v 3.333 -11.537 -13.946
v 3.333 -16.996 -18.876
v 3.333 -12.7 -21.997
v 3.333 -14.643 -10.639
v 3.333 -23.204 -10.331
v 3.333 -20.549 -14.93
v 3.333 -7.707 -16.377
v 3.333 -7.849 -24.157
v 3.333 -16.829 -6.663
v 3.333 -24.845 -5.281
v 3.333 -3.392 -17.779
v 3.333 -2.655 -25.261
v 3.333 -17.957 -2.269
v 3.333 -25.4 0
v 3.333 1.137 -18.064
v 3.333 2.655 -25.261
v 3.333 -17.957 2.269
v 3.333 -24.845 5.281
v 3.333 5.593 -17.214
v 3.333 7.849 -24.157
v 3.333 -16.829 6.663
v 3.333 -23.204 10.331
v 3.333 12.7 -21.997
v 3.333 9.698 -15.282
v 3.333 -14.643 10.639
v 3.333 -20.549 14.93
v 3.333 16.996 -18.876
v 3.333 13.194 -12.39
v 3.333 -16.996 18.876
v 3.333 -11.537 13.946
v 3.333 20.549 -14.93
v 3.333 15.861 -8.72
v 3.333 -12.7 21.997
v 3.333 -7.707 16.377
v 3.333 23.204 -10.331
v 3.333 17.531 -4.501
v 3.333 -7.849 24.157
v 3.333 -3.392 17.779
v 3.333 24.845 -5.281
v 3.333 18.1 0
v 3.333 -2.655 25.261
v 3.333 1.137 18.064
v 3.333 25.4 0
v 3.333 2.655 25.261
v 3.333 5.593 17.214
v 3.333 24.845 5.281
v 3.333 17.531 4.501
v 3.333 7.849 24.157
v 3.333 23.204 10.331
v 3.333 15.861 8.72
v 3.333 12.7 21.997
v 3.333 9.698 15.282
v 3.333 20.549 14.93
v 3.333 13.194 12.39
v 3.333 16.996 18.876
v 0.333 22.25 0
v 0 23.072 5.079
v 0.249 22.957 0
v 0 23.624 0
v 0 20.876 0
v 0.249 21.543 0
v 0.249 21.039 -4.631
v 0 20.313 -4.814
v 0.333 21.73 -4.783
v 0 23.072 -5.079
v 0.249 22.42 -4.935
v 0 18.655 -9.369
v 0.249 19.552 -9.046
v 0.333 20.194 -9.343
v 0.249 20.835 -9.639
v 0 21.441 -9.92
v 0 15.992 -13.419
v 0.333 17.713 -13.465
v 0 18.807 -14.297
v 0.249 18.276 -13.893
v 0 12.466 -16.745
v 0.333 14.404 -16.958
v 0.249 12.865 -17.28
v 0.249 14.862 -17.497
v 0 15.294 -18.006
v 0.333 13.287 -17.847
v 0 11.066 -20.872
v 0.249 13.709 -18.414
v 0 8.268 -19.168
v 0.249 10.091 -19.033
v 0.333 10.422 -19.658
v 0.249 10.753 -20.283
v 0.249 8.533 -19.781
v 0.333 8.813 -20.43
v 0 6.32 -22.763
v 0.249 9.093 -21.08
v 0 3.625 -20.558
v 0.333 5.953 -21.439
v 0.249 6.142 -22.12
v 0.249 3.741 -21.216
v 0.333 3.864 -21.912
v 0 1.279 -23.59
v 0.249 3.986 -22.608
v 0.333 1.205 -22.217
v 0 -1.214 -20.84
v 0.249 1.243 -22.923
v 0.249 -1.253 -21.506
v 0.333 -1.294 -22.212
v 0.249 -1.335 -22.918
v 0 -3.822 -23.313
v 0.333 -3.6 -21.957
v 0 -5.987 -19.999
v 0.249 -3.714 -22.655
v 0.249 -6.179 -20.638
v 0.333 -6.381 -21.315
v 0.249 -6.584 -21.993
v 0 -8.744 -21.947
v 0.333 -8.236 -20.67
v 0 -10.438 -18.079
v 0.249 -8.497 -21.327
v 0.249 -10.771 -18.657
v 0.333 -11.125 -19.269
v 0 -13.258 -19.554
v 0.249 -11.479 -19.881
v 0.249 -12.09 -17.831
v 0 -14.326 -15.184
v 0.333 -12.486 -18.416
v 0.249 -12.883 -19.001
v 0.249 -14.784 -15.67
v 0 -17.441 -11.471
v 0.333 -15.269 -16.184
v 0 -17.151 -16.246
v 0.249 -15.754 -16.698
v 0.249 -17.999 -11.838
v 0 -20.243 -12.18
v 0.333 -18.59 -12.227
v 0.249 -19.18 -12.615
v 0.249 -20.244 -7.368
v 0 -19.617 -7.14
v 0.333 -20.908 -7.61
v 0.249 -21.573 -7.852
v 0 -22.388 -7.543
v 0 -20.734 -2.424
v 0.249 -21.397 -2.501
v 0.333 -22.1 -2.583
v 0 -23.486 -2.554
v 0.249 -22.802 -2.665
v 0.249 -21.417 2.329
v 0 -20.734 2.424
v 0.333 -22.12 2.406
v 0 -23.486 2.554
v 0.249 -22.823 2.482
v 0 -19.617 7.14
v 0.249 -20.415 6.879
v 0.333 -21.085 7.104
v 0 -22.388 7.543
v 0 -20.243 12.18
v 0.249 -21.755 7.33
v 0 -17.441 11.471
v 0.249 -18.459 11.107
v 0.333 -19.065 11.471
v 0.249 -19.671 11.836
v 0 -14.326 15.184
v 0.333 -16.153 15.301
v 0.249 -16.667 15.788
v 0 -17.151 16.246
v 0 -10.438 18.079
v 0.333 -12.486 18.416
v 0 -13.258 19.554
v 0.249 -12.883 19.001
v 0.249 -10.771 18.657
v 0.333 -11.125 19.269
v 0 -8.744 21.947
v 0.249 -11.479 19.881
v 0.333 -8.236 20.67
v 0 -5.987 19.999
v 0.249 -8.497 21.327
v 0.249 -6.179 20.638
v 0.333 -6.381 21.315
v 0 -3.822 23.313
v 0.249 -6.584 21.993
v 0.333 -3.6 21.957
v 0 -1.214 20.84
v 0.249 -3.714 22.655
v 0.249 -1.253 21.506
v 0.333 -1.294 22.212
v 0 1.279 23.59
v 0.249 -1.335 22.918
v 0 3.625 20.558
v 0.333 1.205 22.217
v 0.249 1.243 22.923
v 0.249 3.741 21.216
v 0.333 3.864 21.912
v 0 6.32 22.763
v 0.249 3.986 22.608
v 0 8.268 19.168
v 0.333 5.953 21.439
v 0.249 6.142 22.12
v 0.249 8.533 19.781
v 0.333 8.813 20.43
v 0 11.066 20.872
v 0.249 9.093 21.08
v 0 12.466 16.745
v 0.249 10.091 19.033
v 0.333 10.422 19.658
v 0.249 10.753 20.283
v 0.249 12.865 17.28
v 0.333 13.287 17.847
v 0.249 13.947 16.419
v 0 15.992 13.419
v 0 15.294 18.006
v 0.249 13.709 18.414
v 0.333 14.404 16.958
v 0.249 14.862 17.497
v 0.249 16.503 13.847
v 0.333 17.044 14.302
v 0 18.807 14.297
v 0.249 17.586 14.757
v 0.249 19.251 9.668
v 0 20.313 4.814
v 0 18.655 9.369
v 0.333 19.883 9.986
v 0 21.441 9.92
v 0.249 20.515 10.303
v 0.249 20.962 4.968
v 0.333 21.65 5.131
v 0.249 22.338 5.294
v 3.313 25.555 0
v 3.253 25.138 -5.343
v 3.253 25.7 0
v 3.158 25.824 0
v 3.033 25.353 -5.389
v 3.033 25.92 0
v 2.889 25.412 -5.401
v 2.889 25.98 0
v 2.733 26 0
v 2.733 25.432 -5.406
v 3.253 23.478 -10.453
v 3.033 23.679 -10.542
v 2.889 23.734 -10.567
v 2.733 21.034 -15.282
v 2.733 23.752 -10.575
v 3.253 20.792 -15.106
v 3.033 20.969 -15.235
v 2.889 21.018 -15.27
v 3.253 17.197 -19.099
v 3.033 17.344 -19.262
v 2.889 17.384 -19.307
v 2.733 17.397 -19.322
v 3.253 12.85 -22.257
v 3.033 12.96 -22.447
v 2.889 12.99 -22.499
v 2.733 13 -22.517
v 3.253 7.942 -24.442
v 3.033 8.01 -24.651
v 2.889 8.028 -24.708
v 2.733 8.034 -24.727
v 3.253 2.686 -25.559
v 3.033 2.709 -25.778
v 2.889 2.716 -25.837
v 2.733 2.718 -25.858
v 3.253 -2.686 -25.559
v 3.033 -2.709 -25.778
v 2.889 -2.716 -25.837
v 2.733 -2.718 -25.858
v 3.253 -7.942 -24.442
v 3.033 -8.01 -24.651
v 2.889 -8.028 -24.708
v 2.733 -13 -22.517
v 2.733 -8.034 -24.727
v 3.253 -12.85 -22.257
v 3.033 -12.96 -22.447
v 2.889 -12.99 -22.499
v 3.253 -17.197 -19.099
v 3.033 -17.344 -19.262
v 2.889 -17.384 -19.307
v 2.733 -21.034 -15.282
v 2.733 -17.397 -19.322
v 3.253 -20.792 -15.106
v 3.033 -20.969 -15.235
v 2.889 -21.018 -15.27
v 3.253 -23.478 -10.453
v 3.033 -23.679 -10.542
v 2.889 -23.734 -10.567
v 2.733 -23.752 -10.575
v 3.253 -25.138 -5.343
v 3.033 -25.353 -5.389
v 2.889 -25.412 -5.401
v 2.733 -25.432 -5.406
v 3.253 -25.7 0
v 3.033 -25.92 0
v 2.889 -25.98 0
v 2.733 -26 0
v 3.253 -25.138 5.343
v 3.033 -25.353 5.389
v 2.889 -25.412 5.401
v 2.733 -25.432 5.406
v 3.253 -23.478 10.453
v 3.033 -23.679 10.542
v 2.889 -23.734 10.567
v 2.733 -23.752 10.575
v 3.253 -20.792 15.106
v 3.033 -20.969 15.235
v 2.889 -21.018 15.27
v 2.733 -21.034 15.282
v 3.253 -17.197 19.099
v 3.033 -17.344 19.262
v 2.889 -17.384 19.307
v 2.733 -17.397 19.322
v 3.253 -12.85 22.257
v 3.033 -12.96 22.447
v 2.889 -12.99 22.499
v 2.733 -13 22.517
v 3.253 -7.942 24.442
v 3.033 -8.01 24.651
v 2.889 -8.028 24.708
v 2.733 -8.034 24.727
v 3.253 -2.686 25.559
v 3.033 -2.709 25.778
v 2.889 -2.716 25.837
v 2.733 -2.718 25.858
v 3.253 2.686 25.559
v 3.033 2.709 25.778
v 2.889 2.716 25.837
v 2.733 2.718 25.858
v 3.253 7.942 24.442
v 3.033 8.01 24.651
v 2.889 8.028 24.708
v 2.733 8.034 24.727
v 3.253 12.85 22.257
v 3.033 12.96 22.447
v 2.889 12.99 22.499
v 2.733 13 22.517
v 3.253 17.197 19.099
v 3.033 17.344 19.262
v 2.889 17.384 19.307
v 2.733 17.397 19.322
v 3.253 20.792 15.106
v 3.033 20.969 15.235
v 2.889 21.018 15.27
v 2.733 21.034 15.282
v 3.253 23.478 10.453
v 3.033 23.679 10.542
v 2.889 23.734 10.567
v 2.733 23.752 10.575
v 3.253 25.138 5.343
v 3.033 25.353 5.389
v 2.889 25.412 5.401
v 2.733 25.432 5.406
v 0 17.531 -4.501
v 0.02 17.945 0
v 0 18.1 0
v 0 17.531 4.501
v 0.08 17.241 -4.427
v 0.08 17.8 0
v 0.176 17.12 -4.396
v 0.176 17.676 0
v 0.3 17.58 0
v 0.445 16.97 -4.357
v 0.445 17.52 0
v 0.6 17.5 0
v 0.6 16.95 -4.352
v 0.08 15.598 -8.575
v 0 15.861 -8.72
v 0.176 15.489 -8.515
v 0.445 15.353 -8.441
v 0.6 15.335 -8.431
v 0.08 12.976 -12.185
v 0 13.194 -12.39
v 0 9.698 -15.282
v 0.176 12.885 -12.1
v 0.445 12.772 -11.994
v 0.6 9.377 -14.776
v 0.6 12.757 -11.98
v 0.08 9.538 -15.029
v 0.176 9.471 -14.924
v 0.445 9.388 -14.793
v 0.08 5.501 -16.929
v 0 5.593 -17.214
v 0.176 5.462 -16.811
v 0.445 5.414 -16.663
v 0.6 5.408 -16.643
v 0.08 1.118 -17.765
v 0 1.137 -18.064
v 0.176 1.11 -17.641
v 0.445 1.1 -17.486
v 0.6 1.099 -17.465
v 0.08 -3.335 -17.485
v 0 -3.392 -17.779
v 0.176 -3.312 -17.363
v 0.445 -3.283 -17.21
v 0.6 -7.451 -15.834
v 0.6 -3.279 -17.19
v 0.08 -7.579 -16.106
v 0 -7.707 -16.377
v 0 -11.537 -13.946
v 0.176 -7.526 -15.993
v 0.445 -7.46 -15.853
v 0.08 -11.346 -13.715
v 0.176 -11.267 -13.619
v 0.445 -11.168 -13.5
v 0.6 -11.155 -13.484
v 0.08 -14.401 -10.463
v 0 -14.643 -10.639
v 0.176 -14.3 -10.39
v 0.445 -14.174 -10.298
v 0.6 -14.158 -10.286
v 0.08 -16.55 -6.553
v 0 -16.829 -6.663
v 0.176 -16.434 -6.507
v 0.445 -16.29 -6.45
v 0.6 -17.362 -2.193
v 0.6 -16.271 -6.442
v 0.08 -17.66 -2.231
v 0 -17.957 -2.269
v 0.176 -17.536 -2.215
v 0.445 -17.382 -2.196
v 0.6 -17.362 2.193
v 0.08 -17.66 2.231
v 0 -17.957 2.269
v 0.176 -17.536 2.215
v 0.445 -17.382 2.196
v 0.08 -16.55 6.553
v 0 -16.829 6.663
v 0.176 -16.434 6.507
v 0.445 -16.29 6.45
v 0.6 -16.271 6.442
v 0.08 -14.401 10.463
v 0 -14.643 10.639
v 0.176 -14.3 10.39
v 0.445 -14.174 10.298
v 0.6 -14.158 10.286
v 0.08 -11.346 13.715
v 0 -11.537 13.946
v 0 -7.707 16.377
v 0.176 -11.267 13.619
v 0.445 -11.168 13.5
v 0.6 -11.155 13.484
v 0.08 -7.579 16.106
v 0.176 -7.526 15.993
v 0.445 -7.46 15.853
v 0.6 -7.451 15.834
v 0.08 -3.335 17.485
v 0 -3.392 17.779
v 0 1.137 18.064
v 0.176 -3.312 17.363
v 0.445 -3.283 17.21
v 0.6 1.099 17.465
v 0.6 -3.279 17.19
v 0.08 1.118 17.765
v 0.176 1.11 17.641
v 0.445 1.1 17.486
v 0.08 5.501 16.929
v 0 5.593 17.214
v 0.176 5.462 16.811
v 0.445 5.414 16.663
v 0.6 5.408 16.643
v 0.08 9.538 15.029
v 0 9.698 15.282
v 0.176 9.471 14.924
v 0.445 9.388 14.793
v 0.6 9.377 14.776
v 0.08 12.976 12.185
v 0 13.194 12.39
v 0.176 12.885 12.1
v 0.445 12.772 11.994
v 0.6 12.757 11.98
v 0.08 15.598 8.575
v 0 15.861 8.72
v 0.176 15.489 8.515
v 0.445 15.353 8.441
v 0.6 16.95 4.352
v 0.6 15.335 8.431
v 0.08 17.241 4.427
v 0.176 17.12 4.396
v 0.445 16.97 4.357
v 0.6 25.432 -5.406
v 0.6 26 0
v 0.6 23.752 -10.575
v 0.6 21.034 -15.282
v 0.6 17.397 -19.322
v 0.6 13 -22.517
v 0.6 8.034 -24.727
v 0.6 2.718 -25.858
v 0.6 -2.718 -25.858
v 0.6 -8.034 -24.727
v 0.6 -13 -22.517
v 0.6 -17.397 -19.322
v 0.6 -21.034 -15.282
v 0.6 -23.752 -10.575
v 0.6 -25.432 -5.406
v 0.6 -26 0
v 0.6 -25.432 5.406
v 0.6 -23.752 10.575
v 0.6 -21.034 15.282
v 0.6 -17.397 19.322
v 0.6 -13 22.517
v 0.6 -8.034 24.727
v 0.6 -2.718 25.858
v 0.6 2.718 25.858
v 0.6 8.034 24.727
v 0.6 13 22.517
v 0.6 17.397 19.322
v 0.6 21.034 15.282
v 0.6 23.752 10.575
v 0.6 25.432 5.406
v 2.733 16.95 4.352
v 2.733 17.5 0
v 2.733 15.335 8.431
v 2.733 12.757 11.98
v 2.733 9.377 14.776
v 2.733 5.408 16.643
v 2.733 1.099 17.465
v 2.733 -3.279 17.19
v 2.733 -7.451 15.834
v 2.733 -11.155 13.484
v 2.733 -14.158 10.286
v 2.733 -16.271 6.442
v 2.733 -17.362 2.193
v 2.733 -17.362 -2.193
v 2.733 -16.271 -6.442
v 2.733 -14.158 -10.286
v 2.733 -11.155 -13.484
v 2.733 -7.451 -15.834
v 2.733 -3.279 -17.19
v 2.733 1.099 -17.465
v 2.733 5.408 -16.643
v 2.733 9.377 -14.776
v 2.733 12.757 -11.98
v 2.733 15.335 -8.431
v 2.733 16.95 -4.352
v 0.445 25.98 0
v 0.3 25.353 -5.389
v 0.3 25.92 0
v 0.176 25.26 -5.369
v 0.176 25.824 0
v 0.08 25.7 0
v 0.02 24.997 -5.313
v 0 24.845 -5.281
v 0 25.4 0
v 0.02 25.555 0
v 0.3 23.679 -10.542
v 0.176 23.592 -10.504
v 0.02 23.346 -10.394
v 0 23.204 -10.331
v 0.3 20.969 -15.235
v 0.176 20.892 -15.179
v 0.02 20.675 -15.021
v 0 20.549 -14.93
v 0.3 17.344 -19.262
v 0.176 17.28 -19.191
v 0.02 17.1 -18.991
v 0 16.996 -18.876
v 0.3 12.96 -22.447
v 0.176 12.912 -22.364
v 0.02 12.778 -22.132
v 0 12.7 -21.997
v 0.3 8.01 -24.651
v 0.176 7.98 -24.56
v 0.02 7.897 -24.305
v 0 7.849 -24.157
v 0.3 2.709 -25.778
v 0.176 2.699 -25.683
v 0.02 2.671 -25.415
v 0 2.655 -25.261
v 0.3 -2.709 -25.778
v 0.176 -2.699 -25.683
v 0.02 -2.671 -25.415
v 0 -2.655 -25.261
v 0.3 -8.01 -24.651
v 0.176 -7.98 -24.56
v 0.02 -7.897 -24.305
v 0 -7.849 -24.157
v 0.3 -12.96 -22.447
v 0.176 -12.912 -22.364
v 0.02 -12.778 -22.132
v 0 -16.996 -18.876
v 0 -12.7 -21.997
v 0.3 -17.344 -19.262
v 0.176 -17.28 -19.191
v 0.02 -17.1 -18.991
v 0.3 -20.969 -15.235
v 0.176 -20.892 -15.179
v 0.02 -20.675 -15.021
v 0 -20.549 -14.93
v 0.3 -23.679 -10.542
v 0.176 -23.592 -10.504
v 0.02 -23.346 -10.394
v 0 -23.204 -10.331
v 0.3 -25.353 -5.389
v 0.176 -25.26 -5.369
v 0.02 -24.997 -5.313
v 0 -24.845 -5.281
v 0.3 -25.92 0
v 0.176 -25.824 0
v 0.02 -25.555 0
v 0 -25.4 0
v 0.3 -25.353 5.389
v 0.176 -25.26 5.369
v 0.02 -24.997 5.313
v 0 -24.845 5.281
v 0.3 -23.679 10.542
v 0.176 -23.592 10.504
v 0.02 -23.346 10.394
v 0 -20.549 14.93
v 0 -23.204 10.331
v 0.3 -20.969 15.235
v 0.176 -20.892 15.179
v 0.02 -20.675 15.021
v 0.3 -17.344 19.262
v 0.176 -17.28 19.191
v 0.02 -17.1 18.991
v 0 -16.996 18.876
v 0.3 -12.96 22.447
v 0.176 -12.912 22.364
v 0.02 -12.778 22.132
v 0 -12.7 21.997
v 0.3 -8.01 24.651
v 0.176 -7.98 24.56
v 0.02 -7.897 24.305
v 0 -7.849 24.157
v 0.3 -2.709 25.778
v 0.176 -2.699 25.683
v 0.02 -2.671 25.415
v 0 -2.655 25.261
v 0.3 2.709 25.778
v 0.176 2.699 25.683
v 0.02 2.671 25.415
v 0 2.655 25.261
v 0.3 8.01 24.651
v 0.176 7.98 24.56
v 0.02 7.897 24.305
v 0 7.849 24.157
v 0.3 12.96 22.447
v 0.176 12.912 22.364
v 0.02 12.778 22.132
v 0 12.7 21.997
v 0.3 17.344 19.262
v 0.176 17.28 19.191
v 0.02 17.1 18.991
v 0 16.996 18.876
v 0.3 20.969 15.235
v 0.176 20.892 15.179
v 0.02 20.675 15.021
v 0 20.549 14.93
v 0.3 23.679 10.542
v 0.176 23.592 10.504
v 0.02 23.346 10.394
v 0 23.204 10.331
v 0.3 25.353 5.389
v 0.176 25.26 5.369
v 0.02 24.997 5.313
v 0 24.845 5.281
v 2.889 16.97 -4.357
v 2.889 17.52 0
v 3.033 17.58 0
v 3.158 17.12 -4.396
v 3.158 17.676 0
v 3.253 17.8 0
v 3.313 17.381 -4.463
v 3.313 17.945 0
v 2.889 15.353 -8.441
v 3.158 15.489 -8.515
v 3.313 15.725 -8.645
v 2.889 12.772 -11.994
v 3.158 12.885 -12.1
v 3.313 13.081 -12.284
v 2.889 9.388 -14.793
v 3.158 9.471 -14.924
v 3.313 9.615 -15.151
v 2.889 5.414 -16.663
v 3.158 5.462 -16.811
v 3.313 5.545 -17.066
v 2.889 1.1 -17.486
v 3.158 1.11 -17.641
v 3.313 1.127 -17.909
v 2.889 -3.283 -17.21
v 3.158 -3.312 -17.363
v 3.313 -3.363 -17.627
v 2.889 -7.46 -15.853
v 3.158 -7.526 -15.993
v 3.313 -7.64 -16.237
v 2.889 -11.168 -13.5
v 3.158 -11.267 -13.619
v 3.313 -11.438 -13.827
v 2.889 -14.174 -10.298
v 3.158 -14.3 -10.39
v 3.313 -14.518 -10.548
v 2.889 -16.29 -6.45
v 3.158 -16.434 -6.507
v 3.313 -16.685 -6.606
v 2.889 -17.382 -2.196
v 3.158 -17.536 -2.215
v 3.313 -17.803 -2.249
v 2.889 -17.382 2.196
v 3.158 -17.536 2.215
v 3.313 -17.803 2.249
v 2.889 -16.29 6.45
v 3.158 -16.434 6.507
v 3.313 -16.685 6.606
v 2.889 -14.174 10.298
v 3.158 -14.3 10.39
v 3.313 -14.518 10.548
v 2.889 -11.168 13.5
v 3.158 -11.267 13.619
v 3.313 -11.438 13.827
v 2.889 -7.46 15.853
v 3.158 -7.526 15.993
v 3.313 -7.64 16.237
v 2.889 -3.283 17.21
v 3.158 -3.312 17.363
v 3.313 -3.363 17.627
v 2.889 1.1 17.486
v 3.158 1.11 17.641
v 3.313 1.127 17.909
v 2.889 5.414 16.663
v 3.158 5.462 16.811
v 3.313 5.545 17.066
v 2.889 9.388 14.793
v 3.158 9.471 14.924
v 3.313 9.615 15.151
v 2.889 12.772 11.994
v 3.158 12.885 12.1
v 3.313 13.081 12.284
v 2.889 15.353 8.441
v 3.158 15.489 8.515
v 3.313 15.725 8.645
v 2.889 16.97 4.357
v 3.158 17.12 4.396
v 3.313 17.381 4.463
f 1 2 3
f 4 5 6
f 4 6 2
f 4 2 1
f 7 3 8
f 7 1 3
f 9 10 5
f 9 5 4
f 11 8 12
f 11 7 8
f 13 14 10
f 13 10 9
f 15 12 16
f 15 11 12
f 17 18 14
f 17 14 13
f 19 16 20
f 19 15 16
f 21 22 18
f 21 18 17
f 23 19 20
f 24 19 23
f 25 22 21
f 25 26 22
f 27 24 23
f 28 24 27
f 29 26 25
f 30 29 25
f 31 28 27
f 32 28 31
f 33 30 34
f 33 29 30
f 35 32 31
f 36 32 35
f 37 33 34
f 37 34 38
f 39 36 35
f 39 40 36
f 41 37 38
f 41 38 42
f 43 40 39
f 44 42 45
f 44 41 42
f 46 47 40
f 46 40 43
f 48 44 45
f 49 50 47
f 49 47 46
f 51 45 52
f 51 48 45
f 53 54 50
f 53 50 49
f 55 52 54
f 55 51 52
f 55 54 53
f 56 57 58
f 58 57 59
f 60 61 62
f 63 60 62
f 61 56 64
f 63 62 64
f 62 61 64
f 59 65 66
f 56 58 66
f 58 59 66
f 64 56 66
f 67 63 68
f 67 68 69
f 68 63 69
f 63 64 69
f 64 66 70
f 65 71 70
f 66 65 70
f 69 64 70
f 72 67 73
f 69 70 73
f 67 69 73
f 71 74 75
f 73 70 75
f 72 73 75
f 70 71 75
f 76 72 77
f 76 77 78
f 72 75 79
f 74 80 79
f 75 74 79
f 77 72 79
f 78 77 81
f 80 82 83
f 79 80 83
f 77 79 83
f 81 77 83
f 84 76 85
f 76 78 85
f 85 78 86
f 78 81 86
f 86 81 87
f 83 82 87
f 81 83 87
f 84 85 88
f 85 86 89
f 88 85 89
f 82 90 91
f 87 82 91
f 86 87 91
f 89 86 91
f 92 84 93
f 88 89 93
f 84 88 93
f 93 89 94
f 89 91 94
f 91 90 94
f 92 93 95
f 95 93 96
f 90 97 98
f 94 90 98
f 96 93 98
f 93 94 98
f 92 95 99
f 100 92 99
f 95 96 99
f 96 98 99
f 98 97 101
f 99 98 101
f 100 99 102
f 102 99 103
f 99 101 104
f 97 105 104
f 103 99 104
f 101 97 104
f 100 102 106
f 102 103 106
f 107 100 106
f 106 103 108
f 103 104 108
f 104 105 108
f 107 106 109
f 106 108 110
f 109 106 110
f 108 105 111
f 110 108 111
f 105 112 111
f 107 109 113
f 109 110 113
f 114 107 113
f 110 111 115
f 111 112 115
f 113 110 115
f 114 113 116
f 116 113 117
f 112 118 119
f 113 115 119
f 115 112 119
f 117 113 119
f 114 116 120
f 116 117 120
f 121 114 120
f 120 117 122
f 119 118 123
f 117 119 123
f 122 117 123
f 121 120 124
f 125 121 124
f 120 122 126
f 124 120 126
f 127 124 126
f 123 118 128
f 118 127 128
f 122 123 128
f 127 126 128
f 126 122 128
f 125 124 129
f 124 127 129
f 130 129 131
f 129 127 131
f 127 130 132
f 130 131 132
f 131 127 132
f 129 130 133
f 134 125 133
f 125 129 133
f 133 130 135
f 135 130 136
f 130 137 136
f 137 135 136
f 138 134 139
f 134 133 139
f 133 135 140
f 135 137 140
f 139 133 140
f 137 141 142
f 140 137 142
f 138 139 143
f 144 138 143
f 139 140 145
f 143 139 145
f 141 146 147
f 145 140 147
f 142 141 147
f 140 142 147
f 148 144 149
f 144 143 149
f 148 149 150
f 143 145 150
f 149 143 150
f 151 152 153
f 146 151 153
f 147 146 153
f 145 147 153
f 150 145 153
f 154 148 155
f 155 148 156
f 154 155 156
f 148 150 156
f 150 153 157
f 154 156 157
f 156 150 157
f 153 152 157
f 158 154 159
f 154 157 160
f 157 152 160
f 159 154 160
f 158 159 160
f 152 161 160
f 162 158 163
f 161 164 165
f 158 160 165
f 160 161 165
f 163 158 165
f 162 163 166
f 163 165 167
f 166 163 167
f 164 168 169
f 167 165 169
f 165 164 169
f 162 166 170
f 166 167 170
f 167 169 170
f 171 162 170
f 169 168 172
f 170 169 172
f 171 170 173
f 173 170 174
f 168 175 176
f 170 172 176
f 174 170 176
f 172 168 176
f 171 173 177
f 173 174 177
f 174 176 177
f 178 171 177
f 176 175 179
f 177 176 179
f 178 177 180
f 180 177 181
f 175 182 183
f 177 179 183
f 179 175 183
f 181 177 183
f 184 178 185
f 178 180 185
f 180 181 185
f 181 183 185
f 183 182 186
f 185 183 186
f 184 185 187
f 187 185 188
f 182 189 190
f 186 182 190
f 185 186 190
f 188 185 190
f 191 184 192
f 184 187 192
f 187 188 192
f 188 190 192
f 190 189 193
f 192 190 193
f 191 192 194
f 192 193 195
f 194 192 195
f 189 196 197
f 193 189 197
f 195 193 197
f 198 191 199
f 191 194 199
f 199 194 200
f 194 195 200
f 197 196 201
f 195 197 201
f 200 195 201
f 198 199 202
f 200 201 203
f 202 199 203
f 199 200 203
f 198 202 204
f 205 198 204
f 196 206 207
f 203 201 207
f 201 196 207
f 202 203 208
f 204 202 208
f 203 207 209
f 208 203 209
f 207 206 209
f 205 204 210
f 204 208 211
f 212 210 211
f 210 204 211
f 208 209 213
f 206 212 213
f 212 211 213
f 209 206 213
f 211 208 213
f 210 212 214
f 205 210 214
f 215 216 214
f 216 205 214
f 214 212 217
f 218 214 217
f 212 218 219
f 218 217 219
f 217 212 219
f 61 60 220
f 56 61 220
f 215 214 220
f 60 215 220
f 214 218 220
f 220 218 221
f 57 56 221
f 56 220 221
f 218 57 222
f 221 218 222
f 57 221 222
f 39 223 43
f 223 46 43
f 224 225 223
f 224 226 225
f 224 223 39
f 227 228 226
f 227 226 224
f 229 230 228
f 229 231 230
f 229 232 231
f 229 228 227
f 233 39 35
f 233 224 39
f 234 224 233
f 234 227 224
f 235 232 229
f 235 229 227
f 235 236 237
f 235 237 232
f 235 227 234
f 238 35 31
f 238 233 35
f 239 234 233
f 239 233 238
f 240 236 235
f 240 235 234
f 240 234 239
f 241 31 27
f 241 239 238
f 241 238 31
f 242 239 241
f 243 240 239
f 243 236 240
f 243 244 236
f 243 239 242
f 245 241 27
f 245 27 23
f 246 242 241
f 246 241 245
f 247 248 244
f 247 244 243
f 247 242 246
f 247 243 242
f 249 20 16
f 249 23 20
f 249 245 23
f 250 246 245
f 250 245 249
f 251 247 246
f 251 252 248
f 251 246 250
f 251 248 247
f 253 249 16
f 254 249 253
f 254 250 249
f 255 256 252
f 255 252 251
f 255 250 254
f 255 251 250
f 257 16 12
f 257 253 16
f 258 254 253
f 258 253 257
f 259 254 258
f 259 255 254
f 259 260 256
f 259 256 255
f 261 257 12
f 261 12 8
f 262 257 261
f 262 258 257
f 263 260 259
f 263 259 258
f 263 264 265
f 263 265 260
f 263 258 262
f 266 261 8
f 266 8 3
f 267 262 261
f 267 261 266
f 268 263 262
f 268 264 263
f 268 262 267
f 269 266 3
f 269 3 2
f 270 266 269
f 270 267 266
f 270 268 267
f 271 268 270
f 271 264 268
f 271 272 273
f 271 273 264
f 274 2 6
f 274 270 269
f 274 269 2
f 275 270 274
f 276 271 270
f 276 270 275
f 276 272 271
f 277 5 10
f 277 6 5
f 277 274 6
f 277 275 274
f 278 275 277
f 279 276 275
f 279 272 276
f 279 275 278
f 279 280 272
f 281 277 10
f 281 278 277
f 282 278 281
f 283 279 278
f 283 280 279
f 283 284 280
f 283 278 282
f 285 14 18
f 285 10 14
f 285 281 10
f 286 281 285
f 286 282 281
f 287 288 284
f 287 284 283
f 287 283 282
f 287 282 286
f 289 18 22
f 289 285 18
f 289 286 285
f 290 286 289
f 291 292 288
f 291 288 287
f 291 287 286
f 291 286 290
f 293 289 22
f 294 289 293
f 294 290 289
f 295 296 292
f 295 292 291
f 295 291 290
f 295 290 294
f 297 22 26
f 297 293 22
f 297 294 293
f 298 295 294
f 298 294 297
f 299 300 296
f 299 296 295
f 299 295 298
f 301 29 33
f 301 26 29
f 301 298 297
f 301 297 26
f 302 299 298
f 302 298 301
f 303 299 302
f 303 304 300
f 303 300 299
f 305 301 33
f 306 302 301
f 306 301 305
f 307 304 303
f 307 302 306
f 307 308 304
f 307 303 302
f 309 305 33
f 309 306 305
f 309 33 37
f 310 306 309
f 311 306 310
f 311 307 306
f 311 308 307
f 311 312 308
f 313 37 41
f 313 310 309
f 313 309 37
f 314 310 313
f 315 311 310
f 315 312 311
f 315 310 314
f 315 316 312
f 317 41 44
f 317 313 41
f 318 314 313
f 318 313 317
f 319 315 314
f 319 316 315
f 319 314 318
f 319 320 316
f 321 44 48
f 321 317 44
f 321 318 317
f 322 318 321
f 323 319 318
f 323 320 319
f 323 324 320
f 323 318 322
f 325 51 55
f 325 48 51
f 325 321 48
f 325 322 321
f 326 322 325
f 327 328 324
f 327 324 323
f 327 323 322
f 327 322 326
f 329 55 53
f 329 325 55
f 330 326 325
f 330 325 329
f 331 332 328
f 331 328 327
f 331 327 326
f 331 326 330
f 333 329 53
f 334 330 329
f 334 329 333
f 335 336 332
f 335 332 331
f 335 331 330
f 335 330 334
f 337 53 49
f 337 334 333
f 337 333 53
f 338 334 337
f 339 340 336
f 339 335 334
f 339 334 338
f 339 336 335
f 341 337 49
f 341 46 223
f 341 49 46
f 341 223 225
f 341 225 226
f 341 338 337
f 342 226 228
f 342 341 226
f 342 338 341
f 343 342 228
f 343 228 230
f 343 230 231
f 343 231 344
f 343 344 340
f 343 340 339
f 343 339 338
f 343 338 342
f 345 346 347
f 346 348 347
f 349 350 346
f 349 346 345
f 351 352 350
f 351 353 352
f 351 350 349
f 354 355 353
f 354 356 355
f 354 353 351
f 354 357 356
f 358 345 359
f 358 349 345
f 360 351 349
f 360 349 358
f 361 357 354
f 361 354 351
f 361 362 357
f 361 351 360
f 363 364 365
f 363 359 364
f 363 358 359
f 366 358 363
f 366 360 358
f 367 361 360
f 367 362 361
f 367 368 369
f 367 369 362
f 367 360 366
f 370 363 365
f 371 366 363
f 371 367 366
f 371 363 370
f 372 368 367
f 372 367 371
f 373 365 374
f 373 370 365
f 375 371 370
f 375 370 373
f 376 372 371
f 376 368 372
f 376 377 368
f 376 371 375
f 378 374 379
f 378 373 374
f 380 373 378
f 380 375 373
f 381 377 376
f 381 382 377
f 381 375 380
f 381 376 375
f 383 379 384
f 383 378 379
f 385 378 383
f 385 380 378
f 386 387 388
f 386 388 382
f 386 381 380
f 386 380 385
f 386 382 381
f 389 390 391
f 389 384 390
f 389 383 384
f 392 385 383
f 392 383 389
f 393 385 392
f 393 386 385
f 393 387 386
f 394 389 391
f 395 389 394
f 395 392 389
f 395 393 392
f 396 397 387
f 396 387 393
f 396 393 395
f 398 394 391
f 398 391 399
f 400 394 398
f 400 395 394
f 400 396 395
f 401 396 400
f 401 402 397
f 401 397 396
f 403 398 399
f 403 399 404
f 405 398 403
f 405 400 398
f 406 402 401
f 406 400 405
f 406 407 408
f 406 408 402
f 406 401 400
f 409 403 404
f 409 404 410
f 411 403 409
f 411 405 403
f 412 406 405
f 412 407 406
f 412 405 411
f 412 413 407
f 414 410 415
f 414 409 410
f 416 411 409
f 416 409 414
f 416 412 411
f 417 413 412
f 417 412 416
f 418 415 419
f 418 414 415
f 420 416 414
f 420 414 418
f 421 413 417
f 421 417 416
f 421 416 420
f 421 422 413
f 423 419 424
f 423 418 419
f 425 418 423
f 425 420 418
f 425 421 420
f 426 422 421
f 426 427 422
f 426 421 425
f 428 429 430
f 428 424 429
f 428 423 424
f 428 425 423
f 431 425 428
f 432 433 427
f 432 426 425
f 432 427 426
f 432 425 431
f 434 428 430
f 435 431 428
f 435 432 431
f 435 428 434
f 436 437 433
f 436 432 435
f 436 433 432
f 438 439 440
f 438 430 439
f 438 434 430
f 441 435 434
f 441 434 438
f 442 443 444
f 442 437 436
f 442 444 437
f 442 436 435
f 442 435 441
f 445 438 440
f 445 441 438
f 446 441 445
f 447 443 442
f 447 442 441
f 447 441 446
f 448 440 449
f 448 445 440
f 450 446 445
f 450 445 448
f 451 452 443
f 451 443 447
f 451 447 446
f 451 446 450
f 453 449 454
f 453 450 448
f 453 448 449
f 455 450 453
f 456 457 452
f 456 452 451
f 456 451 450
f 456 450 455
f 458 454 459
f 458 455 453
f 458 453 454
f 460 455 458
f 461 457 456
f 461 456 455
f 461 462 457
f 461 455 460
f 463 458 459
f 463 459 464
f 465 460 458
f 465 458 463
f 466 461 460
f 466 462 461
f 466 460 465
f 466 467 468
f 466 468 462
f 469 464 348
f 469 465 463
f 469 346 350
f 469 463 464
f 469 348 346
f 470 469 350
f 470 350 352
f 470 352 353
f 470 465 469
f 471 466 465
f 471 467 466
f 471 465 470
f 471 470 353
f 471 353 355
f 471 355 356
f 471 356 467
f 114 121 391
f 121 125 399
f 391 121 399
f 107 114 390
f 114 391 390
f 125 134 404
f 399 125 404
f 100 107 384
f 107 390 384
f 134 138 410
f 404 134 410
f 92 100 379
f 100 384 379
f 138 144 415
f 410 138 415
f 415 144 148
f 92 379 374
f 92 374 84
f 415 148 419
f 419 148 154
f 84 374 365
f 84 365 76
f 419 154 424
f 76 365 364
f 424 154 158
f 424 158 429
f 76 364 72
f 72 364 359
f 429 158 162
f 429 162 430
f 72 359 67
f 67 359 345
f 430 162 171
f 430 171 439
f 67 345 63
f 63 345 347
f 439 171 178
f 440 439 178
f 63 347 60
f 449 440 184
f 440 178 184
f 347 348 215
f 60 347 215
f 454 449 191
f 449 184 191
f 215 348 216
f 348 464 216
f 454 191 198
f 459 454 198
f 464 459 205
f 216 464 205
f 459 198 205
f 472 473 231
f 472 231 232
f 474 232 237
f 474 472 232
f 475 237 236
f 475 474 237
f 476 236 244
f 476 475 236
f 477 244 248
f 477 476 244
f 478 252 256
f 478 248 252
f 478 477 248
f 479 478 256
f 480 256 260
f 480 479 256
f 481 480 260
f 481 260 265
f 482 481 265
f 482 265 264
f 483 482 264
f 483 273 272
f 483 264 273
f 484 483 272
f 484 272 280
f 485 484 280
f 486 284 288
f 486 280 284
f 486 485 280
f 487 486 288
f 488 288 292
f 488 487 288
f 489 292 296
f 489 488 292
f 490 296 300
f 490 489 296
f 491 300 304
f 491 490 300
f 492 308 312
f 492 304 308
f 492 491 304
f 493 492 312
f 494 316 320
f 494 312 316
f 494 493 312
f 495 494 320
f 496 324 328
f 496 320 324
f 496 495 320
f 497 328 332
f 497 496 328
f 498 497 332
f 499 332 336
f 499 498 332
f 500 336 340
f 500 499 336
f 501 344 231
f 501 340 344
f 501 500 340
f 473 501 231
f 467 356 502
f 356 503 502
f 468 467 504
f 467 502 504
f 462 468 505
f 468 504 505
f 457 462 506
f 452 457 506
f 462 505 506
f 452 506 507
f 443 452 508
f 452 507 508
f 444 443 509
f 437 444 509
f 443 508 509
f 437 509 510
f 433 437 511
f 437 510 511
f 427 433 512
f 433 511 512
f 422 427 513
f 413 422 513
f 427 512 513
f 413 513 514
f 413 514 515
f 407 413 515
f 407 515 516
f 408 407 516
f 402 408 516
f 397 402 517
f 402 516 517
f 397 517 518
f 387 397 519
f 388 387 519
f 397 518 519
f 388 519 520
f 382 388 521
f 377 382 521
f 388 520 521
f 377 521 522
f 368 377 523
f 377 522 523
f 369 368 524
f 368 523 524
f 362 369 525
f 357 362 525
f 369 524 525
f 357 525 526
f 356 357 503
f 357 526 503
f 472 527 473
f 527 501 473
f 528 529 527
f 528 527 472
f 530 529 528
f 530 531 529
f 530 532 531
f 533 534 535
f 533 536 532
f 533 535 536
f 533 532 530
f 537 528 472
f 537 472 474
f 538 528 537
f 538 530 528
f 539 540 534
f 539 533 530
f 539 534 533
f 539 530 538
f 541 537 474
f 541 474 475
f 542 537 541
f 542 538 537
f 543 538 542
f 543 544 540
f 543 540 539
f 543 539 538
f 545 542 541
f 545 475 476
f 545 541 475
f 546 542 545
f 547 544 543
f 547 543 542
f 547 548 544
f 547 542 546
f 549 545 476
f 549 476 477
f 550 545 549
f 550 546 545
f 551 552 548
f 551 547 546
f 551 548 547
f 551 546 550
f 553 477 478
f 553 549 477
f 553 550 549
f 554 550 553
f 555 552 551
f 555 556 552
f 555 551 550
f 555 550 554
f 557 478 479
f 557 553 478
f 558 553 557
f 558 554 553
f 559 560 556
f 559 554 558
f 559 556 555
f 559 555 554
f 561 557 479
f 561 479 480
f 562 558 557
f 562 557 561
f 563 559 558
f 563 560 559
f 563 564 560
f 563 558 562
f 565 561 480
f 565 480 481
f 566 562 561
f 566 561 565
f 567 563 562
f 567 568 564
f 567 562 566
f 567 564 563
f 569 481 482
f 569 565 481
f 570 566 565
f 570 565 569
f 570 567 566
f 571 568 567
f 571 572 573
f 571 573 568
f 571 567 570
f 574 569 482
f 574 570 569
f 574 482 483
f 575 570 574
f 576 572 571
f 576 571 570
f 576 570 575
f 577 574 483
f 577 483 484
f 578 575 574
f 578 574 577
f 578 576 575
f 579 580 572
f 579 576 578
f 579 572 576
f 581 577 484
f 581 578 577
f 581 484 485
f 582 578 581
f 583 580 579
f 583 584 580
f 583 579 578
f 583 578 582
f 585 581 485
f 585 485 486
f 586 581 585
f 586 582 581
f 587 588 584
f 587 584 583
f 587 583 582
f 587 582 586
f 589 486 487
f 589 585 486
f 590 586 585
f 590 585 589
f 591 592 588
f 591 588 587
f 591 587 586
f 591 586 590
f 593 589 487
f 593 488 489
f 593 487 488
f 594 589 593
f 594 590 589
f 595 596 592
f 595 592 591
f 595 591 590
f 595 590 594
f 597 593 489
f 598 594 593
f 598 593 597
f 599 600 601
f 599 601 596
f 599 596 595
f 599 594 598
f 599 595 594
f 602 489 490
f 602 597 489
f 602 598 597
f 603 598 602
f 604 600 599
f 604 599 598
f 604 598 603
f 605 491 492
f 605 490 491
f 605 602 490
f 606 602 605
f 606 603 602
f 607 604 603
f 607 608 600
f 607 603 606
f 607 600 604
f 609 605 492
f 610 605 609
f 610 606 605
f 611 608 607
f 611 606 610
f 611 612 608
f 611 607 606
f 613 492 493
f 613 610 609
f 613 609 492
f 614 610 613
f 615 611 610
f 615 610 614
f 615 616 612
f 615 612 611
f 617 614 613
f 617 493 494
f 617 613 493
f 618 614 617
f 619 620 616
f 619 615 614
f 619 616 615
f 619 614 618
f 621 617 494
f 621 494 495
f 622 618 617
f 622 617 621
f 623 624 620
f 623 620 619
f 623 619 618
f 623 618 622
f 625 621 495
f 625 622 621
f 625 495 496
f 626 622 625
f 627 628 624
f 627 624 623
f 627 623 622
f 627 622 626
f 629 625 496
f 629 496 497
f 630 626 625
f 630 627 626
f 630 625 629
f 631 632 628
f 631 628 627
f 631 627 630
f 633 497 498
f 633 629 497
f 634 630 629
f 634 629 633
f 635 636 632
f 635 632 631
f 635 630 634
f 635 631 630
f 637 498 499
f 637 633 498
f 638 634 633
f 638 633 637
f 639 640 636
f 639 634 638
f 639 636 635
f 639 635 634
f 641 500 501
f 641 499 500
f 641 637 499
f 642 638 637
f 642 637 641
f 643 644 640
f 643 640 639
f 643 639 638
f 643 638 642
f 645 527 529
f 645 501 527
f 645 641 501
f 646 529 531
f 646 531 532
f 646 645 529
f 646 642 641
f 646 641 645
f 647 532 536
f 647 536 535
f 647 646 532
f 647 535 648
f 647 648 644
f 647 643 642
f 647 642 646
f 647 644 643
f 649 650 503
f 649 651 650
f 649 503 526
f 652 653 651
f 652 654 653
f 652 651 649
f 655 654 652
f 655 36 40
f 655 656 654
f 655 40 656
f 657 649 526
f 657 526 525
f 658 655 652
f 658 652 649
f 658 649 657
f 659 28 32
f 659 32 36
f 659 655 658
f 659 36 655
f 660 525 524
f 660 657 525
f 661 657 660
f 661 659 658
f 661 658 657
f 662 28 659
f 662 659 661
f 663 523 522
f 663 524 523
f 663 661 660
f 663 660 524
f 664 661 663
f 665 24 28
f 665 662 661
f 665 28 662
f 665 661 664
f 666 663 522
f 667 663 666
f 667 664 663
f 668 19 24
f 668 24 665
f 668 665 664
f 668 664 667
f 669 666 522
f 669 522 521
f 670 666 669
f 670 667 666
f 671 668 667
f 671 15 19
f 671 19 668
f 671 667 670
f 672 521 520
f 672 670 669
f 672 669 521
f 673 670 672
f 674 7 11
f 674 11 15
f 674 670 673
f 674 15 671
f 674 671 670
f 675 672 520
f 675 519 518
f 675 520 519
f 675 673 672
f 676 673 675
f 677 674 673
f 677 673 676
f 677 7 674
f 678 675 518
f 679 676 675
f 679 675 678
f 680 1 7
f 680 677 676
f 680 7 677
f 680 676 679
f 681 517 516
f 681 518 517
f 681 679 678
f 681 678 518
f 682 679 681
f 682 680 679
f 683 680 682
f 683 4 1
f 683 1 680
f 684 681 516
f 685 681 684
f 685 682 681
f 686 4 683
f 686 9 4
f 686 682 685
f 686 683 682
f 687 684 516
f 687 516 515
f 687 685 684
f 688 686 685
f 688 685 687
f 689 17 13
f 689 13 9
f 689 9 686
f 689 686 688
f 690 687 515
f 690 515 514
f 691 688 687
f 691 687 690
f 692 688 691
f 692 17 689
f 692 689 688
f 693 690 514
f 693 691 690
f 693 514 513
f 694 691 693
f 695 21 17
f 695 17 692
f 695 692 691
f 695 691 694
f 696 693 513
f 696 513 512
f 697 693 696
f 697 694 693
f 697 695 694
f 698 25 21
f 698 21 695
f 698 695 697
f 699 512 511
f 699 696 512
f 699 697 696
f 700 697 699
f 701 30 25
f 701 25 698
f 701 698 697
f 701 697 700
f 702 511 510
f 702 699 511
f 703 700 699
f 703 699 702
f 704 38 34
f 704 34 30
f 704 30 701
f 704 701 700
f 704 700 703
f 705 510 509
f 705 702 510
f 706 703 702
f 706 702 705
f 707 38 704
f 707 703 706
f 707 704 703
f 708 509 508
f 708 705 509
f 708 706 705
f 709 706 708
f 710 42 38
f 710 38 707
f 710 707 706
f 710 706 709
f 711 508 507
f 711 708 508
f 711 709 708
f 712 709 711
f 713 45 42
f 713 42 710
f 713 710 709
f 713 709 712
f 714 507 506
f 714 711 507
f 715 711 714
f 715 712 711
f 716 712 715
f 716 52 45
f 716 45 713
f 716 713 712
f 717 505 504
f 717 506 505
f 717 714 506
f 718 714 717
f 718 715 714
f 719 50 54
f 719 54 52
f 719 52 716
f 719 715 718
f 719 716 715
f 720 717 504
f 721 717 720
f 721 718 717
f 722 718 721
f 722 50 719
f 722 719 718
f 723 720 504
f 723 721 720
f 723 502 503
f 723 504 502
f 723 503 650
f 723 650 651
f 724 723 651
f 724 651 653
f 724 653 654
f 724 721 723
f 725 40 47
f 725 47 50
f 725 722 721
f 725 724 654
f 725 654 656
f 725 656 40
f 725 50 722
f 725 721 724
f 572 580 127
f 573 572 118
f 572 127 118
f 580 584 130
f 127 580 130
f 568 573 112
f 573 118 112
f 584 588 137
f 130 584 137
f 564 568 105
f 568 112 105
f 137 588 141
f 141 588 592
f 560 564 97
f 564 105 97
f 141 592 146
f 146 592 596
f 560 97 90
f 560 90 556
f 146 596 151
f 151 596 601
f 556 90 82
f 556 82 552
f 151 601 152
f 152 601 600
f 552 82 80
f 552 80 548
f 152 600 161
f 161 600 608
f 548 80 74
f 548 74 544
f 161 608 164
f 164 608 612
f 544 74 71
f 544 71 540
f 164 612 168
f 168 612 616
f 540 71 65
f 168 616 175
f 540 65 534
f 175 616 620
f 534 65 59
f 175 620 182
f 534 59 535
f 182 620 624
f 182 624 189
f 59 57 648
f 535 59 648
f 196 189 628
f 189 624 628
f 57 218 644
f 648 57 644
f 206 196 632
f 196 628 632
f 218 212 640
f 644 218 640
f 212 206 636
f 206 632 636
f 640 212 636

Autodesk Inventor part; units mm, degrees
sketch "Sketch_1" plane through (0, 0, 0) normal (0, 0, 1) x (1, 0, 0)
  line L0 (3.3333, 0) -> (0, 0)
  arc A0 (0, 20.8756) -> (0, 23.6244) centre (-2.6667, 22.25) ccw
  line L1 (0, 20.8756) -> (0, 18.1)
  arc A1 (0, 18.1) -> (0.6, 17.5) centre (0.6, 18.1) ccw
  line L2 (0.6, 17.5) -> (2.7333, 17.5)
  arc A2 (2.7333, 17.5) -> (3.3333, 18.1) centre (2.7333, 18.1) ccw
  line L3 (3.3333, 18.1) -> (3.3333, 25.4)
  arc A3 (3.3333, 25.4) -> (2.7333, 26) centre (2.7333, 25.4) ccw
  line L4 (2.7333, 26) -> (0.6, 26)
  arc A4 (0.6, 26) -> (0, 25.4) centre (0.6, 25.4) ccw
  line L5 (0, 25.4) -> (0, 23.6244)
revolve "Revolution1" add sketch "Sketch_1" angle 360 about axis through (3.3333, 0, 0) along (1, 0, 0)
ref_plane "SW_HW_XY" through (-8.6667, 0, 0) normal (1, 0, 0) x (0, 0, -1)
ref_plane "SW_HW_YZ" through (-8.6667, 0, 0) normal (0, 0, -1) x (0, 1, 0)
ref_plane "SW_HW_ZX" through (-8.6667, 0, 0) normal (0, 1, 0) x (1, 0, 0)
properties part number "51107 Shaft washer"
